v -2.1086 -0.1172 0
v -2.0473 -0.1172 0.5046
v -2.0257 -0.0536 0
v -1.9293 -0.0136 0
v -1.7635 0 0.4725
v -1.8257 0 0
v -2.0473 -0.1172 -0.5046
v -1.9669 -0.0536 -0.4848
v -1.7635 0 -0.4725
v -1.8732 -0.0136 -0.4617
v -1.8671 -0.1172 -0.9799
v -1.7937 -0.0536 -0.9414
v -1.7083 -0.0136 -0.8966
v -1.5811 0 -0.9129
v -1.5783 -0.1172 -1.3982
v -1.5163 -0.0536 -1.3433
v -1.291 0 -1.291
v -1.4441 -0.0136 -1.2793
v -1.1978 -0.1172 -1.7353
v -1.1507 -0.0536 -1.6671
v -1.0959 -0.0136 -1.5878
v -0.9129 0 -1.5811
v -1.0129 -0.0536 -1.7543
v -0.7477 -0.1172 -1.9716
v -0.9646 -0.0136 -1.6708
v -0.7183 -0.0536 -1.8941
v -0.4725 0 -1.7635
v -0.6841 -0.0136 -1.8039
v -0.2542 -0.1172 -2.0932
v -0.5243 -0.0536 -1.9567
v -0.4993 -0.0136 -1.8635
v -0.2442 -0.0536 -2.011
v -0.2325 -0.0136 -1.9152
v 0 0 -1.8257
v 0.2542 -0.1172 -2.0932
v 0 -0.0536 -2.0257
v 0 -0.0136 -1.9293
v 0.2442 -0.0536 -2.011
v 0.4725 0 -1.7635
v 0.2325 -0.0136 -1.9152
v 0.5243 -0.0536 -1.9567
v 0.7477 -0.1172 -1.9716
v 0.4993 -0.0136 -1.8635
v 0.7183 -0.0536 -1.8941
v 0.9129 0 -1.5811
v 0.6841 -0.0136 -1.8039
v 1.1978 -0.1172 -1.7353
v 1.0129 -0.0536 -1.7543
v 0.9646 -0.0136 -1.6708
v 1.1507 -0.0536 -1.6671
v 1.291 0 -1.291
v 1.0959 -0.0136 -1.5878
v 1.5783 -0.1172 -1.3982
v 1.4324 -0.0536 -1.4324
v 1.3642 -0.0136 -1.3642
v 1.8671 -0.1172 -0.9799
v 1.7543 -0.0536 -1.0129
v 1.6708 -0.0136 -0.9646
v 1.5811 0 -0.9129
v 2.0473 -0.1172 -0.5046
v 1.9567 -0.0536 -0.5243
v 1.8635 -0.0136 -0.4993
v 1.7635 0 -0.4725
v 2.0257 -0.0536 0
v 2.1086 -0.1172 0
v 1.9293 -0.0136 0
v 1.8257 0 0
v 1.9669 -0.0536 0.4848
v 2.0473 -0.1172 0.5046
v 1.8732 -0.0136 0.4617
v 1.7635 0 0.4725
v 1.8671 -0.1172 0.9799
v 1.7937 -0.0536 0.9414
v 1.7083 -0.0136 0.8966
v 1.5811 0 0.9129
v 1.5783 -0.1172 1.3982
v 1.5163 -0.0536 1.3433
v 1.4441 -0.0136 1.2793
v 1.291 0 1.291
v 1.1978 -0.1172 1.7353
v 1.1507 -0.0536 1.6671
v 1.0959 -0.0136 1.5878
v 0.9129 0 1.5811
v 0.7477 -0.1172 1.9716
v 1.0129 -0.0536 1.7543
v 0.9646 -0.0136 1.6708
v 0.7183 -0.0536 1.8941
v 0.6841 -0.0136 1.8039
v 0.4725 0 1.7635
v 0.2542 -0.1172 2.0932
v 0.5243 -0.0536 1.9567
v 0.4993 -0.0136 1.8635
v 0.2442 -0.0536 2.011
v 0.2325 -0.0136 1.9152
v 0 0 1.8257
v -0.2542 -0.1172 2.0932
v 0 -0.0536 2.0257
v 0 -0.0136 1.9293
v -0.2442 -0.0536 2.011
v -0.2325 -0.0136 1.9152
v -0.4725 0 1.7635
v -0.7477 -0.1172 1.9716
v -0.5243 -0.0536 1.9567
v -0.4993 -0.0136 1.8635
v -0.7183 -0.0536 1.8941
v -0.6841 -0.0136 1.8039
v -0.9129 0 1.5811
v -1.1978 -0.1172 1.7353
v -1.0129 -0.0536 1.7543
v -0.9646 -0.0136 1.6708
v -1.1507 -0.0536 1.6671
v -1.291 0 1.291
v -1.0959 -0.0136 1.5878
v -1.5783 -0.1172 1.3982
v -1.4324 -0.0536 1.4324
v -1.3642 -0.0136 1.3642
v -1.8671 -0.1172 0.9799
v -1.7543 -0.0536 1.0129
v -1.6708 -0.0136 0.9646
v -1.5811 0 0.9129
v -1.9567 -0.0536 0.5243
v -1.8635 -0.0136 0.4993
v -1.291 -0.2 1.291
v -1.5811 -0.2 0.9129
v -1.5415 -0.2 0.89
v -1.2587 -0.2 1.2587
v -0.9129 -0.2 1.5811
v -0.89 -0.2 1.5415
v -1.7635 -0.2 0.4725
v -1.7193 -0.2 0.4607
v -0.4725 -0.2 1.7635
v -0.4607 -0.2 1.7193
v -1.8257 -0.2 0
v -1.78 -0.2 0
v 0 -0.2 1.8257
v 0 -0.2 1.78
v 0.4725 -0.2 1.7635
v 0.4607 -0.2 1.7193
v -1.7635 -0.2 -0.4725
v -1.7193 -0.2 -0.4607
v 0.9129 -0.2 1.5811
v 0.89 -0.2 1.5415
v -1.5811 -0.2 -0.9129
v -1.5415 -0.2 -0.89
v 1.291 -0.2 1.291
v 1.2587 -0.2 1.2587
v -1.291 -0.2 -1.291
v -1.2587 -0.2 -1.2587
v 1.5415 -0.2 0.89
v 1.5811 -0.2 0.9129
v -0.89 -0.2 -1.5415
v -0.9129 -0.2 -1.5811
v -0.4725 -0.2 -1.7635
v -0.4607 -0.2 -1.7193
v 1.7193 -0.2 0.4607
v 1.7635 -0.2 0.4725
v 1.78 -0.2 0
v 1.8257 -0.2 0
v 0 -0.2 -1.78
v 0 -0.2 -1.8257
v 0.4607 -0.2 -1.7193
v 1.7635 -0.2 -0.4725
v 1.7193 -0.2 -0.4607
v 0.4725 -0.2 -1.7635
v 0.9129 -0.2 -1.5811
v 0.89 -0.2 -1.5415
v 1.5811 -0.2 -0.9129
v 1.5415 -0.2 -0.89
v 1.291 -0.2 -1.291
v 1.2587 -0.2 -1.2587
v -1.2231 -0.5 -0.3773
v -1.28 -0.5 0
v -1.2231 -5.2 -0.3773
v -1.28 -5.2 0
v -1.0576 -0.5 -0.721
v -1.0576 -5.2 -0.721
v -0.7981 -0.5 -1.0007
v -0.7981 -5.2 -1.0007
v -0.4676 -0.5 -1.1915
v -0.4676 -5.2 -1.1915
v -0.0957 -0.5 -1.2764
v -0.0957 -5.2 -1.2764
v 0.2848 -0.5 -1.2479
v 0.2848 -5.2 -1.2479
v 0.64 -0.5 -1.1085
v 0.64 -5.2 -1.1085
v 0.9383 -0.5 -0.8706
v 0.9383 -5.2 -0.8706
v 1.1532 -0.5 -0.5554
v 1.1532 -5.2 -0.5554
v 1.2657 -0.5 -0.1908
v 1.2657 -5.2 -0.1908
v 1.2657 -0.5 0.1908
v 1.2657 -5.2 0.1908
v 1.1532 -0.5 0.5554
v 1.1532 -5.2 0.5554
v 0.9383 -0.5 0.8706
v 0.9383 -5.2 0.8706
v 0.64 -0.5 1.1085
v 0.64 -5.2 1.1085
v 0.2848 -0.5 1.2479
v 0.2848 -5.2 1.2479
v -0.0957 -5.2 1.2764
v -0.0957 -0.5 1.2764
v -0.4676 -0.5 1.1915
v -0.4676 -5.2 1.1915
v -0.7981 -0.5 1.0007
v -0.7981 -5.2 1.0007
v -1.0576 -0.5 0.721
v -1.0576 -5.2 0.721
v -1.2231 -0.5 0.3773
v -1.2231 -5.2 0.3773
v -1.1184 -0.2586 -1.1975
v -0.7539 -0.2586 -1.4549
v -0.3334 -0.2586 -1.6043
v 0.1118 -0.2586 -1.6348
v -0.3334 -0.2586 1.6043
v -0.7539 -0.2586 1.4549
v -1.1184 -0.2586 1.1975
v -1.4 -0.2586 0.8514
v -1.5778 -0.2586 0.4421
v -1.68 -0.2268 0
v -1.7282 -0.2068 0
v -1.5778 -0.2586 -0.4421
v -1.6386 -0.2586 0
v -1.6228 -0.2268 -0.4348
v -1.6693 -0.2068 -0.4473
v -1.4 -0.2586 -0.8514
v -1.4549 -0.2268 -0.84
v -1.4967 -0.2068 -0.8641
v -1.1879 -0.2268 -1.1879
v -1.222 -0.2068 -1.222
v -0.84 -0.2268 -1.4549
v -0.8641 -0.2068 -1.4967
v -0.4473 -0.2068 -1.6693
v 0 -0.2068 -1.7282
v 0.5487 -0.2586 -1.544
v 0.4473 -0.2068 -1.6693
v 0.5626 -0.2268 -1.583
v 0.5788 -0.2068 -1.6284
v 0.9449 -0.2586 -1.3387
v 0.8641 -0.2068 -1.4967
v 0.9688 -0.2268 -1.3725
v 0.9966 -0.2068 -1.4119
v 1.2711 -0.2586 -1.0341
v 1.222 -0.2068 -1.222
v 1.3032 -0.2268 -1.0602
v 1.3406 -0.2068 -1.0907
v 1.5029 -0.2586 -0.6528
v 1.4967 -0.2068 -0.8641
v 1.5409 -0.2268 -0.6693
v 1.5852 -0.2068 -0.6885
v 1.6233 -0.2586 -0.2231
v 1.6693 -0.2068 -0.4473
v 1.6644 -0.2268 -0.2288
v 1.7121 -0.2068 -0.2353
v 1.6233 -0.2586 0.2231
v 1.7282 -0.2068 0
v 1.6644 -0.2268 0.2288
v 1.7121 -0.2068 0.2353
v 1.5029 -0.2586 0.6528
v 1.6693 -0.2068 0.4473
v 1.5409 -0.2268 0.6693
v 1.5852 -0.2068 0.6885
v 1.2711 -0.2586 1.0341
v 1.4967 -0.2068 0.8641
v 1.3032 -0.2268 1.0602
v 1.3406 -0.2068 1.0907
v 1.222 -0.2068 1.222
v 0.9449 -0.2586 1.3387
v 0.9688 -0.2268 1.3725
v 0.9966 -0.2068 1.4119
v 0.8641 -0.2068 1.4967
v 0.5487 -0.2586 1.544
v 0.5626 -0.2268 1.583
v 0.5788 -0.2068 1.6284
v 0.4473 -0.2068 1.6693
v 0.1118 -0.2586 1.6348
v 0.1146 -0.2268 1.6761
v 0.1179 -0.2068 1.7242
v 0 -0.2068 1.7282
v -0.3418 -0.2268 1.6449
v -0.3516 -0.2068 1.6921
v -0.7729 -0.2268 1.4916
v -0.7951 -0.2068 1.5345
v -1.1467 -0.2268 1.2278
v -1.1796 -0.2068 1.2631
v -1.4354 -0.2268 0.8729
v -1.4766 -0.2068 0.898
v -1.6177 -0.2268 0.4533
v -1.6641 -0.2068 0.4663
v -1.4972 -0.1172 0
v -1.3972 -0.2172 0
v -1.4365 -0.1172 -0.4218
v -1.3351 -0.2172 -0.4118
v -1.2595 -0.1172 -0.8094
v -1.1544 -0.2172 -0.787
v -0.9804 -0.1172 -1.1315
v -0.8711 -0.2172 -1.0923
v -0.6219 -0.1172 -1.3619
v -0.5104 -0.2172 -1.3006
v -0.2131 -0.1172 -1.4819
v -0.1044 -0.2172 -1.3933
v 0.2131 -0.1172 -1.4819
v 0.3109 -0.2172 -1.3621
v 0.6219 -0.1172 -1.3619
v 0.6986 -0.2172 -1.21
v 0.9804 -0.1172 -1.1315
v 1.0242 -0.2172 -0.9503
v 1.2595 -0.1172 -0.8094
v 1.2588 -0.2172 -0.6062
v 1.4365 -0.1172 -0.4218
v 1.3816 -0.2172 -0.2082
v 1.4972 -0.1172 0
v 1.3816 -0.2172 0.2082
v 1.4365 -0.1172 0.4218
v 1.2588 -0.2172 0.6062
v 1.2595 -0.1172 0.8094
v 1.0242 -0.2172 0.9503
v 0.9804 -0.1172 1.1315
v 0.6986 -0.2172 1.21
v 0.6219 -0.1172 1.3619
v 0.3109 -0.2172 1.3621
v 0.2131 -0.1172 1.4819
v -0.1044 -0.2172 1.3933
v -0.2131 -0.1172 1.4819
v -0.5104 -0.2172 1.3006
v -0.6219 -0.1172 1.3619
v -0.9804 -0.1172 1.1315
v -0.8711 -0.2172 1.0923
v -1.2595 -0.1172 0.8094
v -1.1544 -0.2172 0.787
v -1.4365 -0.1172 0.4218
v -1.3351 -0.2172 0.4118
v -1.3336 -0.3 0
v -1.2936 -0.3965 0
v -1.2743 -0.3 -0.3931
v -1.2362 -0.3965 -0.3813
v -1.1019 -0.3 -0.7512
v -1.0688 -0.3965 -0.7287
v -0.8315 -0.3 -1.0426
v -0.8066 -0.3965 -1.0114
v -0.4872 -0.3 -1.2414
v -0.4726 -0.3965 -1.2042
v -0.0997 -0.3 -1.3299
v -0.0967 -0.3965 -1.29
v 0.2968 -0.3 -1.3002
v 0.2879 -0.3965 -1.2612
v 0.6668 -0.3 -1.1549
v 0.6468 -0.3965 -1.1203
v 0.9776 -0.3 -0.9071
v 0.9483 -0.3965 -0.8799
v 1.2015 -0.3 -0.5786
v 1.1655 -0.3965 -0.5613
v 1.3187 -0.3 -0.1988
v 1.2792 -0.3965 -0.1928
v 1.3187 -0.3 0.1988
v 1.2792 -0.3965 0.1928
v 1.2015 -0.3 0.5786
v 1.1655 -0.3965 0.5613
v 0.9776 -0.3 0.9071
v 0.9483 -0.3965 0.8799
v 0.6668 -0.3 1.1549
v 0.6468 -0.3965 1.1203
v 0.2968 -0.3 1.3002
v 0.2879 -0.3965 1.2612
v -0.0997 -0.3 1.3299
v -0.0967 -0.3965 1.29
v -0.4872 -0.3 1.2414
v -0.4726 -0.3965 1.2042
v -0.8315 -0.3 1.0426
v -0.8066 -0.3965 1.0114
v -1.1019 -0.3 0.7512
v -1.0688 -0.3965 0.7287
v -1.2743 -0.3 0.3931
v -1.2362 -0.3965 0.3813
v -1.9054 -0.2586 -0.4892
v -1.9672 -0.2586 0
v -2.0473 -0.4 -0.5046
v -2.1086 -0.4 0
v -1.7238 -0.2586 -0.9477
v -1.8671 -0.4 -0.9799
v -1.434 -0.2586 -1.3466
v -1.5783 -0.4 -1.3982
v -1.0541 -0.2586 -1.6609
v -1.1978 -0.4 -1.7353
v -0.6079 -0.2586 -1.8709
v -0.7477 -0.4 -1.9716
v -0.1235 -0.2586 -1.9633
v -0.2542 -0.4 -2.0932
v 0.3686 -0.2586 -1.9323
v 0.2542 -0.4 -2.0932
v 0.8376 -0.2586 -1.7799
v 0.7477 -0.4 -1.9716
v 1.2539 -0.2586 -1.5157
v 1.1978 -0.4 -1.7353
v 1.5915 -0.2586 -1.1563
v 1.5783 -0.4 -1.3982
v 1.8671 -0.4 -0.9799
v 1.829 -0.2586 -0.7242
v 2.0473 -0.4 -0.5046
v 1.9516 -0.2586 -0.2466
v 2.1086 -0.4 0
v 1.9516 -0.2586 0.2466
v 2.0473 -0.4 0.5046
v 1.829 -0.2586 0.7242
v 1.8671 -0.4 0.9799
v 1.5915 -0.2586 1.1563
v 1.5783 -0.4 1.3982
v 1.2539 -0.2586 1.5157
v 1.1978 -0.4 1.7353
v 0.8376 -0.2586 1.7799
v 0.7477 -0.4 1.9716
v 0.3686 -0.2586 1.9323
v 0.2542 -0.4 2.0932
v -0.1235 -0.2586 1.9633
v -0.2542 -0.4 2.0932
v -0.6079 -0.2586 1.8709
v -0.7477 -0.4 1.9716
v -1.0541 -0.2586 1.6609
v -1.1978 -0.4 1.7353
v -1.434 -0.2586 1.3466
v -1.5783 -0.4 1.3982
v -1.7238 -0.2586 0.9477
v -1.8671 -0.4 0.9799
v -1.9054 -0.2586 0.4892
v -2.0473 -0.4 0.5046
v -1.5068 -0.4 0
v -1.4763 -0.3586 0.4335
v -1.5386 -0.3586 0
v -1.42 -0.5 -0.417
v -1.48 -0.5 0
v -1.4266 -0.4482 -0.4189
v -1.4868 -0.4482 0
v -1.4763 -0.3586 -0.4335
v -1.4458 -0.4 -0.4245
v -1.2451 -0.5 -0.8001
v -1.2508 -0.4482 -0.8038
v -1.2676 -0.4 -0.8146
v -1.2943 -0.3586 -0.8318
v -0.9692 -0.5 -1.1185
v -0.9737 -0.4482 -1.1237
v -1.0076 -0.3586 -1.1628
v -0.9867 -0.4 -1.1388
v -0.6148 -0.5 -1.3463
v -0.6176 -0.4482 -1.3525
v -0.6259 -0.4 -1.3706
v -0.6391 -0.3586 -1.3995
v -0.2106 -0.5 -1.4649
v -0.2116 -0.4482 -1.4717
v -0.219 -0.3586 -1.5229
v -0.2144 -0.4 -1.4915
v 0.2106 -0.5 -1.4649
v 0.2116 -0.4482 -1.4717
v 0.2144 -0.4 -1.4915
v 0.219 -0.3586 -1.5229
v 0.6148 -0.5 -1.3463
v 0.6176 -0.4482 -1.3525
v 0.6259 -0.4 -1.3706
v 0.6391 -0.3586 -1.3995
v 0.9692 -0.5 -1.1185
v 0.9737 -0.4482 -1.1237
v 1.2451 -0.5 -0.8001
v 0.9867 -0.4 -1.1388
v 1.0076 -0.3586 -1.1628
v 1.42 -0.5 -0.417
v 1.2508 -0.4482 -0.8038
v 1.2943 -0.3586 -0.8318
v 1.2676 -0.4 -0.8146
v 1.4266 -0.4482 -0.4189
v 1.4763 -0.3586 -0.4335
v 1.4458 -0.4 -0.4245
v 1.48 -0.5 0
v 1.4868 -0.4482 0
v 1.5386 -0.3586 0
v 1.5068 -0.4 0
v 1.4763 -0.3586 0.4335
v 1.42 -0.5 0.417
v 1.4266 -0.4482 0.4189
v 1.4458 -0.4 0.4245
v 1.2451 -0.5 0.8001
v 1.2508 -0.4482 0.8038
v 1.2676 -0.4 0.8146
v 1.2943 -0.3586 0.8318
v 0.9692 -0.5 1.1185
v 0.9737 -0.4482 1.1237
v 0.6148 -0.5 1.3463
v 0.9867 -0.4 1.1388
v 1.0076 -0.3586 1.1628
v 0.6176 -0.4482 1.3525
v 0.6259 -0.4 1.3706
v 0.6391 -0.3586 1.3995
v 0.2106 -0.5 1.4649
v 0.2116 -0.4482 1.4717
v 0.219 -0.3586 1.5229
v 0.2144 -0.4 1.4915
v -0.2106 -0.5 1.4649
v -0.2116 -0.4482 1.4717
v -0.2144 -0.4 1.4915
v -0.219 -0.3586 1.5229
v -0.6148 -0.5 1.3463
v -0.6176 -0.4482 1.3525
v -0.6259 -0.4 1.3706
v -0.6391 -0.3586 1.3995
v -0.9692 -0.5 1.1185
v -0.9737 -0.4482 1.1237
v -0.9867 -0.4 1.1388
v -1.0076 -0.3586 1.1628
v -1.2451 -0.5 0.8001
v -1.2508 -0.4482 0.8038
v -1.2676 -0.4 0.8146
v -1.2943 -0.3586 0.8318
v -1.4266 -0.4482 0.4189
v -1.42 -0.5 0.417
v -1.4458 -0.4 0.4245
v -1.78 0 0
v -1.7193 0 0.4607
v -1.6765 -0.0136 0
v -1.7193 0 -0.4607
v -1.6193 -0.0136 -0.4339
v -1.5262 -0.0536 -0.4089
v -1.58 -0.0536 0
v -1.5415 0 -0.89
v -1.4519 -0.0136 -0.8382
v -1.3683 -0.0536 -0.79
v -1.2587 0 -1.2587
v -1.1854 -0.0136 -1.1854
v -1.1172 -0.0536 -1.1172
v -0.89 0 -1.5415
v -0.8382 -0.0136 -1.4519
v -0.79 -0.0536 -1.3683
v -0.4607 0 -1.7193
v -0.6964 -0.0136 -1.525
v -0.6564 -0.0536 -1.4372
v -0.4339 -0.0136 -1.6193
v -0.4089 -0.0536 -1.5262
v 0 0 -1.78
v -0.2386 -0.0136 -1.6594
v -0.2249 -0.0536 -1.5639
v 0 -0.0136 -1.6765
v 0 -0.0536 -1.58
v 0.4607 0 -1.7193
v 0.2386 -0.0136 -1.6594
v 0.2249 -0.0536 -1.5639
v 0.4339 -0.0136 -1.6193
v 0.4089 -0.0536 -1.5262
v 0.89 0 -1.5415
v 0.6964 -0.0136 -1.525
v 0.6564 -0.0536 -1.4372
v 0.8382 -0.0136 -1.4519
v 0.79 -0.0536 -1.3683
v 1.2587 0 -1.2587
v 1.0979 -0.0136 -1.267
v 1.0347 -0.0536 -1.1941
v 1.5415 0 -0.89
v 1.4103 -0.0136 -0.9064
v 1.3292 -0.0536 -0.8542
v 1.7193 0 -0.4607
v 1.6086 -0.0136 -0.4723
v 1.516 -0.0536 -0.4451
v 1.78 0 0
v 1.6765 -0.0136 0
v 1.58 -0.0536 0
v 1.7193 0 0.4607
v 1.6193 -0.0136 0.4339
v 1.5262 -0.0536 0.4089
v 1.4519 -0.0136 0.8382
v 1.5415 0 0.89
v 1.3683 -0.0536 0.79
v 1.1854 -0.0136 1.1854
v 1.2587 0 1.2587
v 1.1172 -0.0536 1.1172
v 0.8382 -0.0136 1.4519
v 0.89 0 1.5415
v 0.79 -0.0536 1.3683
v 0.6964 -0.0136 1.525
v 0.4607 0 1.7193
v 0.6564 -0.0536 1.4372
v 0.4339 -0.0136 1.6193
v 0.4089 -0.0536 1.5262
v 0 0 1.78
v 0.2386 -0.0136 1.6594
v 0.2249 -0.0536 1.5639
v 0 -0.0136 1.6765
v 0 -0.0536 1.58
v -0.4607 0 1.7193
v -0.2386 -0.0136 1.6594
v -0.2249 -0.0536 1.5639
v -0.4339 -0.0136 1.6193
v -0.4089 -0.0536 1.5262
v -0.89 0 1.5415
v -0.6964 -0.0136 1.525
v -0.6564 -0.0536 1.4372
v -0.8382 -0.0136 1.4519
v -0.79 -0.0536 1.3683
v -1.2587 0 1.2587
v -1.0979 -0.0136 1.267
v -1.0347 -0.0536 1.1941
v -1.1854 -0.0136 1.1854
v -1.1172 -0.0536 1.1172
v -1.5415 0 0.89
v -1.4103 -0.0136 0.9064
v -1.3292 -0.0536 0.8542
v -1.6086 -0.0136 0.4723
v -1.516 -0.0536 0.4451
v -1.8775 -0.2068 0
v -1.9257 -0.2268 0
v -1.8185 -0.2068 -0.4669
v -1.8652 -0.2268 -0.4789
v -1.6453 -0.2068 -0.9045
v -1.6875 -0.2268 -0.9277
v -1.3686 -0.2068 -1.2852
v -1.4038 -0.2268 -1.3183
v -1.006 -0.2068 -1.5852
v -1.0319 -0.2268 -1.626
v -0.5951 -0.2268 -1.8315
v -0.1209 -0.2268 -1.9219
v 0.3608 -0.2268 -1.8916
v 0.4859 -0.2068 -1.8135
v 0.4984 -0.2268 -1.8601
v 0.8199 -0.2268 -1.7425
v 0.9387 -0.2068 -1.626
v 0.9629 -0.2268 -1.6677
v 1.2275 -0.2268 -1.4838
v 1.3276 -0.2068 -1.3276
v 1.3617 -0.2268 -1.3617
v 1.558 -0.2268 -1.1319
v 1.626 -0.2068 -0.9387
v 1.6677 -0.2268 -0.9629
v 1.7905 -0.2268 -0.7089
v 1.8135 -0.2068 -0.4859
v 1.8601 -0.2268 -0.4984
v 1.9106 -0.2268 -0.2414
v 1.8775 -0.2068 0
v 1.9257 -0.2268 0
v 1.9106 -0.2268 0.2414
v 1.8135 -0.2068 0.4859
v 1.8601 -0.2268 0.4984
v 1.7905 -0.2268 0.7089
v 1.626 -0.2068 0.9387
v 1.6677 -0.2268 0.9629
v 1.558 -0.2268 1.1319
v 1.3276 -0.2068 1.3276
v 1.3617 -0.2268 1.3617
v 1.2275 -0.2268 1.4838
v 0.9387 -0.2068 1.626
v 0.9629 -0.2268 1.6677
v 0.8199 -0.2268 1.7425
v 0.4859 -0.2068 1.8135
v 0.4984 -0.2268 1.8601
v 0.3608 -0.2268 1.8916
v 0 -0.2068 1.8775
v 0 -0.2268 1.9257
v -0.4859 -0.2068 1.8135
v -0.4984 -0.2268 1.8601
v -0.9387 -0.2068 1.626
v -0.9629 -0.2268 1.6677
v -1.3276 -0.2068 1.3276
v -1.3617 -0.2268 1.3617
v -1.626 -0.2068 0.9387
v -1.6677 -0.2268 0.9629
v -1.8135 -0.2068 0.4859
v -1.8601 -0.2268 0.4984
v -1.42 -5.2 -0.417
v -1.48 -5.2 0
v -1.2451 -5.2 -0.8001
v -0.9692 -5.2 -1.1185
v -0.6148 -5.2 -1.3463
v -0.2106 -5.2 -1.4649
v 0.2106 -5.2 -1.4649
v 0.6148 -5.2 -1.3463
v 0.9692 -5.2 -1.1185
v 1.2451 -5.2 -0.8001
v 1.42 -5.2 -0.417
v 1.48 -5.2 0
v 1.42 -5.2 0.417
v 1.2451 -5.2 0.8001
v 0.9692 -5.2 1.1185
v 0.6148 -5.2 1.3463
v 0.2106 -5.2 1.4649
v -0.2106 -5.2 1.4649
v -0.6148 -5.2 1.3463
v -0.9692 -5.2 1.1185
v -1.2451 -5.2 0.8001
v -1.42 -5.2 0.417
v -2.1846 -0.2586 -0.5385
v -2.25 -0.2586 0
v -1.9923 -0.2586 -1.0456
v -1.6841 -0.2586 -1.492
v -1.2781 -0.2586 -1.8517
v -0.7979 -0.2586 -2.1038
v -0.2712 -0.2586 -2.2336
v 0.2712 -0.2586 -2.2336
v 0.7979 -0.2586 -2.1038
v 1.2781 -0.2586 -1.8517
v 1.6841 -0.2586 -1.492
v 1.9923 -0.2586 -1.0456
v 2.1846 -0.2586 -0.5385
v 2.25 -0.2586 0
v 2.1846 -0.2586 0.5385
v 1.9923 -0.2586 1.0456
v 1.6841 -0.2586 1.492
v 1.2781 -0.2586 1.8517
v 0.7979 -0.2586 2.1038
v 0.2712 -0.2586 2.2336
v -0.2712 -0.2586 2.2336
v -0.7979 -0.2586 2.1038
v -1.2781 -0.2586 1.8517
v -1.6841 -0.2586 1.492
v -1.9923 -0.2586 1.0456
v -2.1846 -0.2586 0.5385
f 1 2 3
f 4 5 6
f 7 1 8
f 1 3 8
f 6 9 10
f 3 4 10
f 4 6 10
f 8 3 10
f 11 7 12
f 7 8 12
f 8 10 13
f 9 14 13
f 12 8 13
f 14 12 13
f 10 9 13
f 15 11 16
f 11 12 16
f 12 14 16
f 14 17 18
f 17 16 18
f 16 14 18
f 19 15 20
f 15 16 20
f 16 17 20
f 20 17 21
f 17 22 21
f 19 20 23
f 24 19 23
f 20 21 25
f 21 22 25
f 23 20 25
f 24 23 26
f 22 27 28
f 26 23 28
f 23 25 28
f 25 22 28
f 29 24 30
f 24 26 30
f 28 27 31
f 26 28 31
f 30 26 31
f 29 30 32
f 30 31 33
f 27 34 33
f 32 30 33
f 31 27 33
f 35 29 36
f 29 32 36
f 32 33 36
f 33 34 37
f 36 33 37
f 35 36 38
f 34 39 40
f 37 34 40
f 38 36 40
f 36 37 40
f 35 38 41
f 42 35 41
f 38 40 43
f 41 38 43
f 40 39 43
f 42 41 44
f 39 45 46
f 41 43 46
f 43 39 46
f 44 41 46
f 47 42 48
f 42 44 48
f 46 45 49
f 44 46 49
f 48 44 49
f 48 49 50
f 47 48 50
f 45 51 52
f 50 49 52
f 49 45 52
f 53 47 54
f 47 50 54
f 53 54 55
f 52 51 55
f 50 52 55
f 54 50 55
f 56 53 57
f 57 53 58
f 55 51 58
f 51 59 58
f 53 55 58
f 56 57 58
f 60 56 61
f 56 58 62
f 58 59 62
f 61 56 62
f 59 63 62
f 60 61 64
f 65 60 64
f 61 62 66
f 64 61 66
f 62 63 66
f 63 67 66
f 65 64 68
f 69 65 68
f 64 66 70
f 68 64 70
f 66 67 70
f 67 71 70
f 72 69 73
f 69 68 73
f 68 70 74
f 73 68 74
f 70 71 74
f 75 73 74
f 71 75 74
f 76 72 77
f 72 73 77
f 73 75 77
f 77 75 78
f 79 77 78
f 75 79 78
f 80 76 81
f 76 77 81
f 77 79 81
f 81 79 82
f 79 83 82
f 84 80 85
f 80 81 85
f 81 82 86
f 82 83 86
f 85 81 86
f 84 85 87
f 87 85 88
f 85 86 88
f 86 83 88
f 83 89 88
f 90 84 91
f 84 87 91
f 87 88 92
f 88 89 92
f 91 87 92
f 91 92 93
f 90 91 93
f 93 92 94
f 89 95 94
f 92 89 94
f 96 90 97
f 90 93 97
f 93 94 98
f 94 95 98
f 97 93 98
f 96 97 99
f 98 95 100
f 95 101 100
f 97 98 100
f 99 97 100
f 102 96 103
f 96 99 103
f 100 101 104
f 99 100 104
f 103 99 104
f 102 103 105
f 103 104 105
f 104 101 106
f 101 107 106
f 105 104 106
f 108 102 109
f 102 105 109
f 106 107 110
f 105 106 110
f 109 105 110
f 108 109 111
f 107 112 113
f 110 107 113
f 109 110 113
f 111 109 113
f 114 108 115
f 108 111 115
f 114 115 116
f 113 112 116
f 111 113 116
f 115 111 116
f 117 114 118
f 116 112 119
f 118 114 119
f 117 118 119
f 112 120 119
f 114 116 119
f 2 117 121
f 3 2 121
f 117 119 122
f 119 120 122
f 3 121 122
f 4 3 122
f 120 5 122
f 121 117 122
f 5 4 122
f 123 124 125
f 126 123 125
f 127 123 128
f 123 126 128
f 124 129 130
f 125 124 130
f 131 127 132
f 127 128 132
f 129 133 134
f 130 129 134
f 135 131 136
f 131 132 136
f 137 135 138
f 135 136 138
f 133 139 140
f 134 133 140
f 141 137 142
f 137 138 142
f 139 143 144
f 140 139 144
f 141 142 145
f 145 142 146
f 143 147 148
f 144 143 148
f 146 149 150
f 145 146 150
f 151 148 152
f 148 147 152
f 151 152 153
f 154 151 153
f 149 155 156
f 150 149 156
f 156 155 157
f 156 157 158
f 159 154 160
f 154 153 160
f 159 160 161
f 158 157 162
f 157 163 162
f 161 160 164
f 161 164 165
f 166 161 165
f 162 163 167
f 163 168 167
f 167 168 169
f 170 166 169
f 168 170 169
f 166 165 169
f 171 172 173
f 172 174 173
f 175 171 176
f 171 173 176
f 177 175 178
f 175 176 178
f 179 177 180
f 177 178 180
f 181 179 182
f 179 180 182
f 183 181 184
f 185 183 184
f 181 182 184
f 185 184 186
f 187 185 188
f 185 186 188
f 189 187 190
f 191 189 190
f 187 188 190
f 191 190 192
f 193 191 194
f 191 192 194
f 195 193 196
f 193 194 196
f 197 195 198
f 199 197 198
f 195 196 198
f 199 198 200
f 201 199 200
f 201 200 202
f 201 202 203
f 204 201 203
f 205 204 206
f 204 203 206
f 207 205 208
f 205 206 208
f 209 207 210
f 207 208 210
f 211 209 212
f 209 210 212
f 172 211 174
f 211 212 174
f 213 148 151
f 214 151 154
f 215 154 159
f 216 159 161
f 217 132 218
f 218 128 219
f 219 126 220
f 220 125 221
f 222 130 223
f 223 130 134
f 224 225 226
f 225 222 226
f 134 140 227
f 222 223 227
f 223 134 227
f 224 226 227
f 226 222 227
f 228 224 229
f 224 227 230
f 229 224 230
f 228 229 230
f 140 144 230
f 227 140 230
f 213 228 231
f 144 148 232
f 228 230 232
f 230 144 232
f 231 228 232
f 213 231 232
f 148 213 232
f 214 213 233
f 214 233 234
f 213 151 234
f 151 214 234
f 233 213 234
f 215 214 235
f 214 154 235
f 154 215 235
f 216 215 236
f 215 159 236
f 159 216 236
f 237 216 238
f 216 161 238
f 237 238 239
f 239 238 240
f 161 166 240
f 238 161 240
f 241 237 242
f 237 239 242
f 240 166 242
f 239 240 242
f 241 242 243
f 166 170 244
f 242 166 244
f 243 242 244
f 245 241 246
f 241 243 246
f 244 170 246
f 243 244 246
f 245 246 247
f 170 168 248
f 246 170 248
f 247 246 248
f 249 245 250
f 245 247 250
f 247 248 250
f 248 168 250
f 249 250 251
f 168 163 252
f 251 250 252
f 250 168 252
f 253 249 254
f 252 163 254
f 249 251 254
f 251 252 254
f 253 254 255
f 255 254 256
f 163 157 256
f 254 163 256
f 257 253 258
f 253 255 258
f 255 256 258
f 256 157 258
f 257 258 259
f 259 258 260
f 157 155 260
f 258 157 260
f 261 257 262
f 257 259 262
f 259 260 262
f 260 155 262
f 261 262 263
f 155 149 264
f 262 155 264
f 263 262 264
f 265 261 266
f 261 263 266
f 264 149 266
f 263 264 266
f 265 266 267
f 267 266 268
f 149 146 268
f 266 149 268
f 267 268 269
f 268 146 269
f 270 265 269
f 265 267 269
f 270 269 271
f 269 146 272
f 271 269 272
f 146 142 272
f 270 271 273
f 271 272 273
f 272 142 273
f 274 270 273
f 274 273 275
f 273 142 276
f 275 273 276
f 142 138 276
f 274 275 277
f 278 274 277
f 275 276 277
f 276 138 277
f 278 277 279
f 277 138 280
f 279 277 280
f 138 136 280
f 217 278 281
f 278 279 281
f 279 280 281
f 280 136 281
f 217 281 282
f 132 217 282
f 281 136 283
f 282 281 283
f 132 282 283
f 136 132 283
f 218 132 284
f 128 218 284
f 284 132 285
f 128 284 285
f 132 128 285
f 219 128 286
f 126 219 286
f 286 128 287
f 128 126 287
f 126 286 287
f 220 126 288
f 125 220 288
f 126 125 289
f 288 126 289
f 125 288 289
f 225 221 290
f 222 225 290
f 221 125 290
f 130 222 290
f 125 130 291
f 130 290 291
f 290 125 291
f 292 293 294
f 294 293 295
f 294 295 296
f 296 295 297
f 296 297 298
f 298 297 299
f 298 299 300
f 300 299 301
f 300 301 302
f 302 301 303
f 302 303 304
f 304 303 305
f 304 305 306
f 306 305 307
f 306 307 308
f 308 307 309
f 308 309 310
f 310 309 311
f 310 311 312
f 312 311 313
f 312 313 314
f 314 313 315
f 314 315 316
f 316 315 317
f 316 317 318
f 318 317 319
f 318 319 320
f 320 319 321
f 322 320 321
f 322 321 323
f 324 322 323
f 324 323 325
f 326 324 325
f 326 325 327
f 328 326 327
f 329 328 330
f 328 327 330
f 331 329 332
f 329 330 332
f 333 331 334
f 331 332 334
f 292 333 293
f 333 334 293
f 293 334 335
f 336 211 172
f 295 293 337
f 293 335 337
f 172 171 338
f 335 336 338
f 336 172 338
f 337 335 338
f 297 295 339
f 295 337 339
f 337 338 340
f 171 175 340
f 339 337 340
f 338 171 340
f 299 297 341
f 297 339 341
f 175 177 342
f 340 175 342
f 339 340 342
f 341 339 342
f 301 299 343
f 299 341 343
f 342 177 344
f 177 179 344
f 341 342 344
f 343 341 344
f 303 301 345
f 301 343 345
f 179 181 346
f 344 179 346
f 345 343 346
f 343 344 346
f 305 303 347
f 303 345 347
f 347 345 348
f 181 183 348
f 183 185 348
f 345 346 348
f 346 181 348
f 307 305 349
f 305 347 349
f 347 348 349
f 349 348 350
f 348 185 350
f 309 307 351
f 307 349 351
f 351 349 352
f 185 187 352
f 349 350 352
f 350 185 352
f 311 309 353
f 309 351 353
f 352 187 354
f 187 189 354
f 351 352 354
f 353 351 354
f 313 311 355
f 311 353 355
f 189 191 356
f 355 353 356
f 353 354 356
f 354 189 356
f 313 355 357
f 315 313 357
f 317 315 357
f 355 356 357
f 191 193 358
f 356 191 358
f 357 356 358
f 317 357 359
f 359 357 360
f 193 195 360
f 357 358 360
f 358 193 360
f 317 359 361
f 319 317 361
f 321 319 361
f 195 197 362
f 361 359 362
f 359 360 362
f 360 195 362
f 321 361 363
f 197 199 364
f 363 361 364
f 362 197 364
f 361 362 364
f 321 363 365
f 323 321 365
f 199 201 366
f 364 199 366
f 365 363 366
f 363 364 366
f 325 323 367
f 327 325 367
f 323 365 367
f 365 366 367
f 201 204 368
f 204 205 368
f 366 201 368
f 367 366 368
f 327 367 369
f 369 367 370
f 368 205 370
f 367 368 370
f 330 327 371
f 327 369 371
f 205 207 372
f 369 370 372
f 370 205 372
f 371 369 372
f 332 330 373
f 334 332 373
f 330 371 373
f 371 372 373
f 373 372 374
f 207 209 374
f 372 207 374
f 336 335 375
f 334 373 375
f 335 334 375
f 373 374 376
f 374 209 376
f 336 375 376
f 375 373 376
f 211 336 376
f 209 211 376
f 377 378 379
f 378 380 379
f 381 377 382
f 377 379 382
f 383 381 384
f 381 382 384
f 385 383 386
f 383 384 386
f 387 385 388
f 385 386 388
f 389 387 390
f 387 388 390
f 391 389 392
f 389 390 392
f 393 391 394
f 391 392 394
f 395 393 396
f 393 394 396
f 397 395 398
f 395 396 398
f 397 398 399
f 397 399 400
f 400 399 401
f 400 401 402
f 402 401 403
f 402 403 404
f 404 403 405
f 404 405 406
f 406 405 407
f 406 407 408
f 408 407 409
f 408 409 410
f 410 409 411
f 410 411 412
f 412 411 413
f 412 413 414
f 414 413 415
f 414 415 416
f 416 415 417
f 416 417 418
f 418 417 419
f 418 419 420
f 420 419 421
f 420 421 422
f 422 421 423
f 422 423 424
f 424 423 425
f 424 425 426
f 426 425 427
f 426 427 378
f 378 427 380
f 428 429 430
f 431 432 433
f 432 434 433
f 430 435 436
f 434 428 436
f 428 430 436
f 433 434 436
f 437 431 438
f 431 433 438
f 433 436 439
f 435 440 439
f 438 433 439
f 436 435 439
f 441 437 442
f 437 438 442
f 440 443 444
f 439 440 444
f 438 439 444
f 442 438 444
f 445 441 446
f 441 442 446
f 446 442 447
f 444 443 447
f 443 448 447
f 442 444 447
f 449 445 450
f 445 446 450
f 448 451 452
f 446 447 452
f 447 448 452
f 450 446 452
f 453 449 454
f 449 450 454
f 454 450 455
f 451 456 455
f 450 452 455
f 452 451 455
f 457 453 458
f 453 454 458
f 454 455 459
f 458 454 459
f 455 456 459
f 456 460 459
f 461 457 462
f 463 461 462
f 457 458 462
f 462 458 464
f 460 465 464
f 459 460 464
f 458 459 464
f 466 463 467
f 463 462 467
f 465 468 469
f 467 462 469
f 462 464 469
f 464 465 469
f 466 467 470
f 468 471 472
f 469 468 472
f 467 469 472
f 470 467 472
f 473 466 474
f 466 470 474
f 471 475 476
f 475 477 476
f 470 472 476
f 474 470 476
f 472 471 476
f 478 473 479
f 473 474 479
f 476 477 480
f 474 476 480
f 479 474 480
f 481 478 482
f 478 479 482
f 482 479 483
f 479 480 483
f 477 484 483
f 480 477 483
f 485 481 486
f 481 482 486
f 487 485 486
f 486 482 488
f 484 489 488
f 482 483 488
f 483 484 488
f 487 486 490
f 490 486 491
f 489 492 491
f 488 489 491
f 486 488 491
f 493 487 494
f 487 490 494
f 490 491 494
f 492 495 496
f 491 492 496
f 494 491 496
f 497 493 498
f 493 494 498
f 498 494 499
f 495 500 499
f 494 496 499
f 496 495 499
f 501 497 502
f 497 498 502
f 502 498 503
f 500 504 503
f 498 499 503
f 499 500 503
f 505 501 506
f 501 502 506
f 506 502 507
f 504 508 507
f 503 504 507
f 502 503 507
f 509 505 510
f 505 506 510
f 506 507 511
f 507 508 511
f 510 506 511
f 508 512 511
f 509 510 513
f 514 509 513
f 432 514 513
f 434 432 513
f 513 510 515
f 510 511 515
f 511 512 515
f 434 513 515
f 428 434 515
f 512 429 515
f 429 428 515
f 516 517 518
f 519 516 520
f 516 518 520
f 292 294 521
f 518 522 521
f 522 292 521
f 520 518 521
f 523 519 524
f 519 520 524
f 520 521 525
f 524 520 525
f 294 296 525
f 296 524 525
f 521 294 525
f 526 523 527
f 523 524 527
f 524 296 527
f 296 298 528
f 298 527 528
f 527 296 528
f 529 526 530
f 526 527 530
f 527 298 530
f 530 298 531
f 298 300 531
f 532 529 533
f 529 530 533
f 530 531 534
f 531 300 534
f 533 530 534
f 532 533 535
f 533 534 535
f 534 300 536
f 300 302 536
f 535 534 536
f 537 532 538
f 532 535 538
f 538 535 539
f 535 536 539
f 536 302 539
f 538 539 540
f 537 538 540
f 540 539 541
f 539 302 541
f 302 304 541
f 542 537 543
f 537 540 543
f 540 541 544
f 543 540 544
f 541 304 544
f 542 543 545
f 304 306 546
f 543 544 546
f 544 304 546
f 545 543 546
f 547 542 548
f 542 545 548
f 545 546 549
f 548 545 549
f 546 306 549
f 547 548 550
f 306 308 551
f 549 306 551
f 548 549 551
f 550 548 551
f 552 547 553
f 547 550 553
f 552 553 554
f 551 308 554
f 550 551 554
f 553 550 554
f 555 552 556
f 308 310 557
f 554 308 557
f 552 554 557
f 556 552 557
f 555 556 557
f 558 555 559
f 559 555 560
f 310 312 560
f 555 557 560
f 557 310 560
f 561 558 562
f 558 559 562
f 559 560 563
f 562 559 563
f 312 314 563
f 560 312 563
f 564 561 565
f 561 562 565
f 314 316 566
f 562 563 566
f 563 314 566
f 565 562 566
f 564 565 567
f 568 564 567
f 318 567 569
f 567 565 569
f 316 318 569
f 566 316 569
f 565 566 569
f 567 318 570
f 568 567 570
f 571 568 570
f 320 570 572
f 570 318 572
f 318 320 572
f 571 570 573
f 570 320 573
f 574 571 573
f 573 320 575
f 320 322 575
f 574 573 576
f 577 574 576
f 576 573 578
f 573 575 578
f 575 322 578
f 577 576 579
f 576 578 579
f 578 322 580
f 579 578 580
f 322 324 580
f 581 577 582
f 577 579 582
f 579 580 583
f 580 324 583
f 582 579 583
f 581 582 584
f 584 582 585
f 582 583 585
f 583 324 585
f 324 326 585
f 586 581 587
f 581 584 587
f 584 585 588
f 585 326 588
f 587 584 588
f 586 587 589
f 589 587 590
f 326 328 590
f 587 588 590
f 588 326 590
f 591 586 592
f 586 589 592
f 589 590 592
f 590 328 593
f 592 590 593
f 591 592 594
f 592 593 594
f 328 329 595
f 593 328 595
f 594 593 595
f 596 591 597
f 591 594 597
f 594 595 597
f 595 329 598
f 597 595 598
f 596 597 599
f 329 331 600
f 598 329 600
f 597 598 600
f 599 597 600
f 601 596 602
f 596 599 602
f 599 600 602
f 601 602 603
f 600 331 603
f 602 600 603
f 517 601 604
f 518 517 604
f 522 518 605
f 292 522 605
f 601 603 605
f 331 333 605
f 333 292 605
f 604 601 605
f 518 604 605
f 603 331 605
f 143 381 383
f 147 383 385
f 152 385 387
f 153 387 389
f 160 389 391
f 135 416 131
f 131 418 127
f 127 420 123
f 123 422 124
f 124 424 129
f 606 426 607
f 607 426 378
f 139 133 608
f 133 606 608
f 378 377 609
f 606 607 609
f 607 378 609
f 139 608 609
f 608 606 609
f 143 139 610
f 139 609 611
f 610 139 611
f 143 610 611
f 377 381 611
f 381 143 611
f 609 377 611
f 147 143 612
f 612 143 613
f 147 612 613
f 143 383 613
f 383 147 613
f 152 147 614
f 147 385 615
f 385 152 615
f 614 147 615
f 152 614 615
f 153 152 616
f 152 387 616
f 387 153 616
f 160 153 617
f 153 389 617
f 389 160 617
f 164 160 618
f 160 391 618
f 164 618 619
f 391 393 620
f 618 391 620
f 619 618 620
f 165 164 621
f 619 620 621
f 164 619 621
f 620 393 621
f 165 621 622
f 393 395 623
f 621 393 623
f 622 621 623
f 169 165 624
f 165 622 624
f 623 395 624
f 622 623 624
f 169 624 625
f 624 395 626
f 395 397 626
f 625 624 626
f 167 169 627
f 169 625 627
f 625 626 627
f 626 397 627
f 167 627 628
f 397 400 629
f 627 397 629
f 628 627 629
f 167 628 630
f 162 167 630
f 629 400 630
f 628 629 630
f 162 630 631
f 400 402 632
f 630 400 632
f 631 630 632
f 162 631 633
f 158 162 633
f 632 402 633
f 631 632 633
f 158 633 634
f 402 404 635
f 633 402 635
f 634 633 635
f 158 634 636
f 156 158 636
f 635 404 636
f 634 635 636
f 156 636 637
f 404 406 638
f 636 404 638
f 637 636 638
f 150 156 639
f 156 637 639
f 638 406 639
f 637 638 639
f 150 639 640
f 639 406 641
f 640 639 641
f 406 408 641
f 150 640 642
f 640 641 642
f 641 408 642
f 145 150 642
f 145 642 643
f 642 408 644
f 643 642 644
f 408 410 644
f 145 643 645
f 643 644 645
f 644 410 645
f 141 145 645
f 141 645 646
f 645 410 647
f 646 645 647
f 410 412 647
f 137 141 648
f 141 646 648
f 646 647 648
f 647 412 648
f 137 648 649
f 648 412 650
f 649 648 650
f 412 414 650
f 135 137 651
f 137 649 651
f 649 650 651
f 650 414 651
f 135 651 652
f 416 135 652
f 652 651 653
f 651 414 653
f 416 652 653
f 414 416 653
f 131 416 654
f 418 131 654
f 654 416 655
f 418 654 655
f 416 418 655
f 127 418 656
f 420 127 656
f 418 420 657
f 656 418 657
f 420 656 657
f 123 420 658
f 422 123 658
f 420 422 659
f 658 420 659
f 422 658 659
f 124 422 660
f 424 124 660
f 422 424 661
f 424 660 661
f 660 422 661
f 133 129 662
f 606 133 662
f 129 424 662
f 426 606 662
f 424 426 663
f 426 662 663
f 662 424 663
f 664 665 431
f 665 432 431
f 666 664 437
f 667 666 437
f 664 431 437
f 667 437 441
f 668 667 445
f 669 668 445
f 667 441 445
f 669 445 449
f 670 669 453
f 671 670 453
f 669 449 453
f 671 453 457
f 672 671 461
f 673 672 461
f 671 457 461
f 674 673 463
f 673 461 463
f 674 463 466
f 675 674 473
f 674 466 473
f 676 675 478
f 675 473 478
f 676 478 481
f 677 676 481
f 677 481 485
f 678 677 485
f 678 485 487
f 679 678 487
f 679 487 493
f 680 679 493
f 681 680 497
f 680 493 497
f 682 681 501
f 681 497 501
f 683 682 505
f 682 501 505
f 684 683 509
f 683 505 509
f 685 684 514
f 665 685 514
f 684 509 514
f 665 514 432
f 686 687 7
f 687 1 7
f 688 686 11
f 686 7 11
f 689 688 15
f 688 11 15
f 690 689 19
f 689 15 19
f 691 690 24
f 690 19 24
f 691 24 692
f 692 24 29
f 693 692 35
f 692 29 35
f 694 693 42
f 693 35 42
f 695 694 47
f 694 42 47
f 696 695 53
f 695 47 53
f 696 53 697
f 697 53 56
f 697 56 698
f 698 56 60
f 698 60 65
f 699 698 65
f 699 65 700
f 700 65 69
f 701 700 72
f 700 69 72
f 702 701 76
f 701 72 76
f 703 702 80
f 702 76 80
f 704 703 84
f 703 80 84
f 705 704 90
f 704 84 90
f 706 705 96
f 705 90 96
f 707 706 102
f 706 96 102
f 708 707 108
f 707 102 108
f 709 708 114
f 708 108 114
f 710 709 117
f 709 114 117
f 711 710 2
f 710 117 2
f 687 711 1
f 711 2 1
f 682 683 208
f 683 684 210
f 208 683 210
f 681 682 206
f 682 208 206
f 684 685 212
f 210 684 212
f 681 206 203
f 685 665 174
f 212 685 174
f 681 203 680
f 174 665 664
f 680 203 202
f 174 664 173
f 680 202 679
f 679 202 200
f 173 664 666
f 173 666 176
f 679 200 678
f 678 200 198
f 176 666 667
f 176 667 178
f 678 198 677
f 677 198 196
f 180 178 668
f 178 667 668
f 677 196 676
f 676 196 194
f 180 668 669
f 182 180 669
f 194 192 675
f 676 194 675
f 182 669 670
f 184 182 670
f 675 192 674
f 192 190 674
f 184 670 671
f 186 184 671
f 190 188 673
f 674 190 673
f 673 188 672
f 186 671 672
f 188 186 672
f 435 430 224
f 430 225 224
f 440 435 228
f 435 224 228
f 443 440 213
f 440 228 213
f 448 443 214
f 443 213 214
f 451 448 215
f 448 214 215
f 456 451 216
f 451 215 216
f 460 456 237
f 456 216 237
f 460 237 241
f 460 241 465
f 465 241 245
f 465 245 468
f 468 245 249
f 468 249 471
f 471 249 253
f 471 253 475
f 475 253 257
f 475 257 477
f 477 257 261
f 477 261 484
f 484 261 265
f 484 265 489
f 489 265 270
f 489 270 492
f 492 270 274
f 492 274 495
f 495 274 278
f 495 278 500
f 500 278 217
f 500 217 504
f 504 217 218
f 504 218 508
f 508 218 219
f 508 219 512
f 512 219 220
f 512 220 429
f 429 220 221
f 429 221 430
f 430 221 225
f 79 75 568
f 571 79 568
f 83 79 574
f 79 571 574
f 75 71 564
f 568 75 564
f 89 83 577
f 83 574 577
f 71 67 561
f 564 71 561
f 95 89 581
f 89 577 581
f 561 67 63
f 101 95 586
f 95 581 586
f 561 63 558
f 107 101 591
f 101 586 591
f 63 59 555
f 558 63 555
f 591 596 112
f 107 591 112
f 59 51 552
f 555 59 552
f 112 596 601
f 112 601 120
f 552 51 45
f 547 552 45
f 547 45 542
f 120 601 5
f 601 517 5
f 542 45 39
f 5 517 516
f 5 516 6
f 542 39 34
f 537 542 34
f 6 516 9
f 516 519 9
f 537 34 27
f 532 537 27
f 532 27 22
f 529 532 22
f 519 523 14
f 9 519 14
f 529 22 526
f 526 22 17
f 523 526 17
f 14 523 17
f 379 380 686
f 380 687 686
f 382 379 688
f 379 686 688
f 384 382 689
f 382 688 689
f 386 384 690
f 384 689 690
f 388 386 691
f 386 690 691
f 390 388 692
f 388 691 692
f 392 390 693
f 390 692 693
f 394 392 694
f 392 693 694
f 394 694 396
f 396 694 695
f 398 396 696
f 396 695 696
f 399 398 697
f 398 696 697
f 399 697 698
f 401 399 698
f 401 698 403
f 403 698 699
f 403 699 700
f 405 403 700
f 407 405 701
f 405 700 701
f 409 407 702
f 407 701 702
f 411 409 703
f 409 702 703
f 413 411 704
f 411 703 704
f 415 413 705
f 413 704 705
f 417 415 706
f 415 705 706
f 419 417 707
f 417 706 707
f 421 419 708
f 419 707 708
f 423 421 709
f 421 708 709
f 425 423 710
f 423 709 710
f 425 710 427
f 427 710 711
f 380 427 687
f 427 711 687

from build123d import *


with BuildPart() as part:
    # Esquisse1 → Révolution1 (revolve)
    with BuildSketch(Plane.XY):
        with BuildLine():
            Line((-1.497157288, -0.117157288), (-1.397157288, -0.217157288))
            ThreePointArc((-1.397157288, -0.217157288), (-1.310448187, -0.346926627), (-1.28, -0.5))
            Line((-1.28, -0.5), (-1.28, -5.2))
            Line((-1.28, -5.2), (-1.48, -5.2))
            Line((-1.48, -5.2), (-1.48, -0.5))
            ThreePointArc((-1.48, -0.5), (-1.495224093, -0.423463314), (-1.538578644, -0.358578644))
            Line((-1.538578644, -0.358578644), (-1.638578644, -0.258578644))
            ThreePointArc((-1.638578644, -0.258578644), (-1.703463314, -0.215224093), (-1.78, -0.2))
            Line((-1.78, -0.2), (-1.825735931, -0.2))
            ThreePointArc((-1.825735931, -0.2), (-1.902272618, -0.215224093), (-1.967157288, -0.258578644))
            Line((-1.967157288, -0.258578644), (-2.108578644, -0.4))
            Line((-2.108578644, -0.4), (-2.25, -0.258578644))
            Line((-2.25, -0.258578644), (-2.108578644, -0.117157288))
            ThreePointArc((-2.108578644, -0.117157288), (-1.978809304, -0.030448187), (-1.825735931, 0))
            Line((-1.825735931, 0), (-1.78, 0))
            ThreePointArc((-1.78, 0), (-1.626926627, -0.030448187), (-1.497157288, -0.117157288))
        make_face()
    revolve(axis=Axis((0, 0, 0), (0, -1, 0)))


solid = part.part
